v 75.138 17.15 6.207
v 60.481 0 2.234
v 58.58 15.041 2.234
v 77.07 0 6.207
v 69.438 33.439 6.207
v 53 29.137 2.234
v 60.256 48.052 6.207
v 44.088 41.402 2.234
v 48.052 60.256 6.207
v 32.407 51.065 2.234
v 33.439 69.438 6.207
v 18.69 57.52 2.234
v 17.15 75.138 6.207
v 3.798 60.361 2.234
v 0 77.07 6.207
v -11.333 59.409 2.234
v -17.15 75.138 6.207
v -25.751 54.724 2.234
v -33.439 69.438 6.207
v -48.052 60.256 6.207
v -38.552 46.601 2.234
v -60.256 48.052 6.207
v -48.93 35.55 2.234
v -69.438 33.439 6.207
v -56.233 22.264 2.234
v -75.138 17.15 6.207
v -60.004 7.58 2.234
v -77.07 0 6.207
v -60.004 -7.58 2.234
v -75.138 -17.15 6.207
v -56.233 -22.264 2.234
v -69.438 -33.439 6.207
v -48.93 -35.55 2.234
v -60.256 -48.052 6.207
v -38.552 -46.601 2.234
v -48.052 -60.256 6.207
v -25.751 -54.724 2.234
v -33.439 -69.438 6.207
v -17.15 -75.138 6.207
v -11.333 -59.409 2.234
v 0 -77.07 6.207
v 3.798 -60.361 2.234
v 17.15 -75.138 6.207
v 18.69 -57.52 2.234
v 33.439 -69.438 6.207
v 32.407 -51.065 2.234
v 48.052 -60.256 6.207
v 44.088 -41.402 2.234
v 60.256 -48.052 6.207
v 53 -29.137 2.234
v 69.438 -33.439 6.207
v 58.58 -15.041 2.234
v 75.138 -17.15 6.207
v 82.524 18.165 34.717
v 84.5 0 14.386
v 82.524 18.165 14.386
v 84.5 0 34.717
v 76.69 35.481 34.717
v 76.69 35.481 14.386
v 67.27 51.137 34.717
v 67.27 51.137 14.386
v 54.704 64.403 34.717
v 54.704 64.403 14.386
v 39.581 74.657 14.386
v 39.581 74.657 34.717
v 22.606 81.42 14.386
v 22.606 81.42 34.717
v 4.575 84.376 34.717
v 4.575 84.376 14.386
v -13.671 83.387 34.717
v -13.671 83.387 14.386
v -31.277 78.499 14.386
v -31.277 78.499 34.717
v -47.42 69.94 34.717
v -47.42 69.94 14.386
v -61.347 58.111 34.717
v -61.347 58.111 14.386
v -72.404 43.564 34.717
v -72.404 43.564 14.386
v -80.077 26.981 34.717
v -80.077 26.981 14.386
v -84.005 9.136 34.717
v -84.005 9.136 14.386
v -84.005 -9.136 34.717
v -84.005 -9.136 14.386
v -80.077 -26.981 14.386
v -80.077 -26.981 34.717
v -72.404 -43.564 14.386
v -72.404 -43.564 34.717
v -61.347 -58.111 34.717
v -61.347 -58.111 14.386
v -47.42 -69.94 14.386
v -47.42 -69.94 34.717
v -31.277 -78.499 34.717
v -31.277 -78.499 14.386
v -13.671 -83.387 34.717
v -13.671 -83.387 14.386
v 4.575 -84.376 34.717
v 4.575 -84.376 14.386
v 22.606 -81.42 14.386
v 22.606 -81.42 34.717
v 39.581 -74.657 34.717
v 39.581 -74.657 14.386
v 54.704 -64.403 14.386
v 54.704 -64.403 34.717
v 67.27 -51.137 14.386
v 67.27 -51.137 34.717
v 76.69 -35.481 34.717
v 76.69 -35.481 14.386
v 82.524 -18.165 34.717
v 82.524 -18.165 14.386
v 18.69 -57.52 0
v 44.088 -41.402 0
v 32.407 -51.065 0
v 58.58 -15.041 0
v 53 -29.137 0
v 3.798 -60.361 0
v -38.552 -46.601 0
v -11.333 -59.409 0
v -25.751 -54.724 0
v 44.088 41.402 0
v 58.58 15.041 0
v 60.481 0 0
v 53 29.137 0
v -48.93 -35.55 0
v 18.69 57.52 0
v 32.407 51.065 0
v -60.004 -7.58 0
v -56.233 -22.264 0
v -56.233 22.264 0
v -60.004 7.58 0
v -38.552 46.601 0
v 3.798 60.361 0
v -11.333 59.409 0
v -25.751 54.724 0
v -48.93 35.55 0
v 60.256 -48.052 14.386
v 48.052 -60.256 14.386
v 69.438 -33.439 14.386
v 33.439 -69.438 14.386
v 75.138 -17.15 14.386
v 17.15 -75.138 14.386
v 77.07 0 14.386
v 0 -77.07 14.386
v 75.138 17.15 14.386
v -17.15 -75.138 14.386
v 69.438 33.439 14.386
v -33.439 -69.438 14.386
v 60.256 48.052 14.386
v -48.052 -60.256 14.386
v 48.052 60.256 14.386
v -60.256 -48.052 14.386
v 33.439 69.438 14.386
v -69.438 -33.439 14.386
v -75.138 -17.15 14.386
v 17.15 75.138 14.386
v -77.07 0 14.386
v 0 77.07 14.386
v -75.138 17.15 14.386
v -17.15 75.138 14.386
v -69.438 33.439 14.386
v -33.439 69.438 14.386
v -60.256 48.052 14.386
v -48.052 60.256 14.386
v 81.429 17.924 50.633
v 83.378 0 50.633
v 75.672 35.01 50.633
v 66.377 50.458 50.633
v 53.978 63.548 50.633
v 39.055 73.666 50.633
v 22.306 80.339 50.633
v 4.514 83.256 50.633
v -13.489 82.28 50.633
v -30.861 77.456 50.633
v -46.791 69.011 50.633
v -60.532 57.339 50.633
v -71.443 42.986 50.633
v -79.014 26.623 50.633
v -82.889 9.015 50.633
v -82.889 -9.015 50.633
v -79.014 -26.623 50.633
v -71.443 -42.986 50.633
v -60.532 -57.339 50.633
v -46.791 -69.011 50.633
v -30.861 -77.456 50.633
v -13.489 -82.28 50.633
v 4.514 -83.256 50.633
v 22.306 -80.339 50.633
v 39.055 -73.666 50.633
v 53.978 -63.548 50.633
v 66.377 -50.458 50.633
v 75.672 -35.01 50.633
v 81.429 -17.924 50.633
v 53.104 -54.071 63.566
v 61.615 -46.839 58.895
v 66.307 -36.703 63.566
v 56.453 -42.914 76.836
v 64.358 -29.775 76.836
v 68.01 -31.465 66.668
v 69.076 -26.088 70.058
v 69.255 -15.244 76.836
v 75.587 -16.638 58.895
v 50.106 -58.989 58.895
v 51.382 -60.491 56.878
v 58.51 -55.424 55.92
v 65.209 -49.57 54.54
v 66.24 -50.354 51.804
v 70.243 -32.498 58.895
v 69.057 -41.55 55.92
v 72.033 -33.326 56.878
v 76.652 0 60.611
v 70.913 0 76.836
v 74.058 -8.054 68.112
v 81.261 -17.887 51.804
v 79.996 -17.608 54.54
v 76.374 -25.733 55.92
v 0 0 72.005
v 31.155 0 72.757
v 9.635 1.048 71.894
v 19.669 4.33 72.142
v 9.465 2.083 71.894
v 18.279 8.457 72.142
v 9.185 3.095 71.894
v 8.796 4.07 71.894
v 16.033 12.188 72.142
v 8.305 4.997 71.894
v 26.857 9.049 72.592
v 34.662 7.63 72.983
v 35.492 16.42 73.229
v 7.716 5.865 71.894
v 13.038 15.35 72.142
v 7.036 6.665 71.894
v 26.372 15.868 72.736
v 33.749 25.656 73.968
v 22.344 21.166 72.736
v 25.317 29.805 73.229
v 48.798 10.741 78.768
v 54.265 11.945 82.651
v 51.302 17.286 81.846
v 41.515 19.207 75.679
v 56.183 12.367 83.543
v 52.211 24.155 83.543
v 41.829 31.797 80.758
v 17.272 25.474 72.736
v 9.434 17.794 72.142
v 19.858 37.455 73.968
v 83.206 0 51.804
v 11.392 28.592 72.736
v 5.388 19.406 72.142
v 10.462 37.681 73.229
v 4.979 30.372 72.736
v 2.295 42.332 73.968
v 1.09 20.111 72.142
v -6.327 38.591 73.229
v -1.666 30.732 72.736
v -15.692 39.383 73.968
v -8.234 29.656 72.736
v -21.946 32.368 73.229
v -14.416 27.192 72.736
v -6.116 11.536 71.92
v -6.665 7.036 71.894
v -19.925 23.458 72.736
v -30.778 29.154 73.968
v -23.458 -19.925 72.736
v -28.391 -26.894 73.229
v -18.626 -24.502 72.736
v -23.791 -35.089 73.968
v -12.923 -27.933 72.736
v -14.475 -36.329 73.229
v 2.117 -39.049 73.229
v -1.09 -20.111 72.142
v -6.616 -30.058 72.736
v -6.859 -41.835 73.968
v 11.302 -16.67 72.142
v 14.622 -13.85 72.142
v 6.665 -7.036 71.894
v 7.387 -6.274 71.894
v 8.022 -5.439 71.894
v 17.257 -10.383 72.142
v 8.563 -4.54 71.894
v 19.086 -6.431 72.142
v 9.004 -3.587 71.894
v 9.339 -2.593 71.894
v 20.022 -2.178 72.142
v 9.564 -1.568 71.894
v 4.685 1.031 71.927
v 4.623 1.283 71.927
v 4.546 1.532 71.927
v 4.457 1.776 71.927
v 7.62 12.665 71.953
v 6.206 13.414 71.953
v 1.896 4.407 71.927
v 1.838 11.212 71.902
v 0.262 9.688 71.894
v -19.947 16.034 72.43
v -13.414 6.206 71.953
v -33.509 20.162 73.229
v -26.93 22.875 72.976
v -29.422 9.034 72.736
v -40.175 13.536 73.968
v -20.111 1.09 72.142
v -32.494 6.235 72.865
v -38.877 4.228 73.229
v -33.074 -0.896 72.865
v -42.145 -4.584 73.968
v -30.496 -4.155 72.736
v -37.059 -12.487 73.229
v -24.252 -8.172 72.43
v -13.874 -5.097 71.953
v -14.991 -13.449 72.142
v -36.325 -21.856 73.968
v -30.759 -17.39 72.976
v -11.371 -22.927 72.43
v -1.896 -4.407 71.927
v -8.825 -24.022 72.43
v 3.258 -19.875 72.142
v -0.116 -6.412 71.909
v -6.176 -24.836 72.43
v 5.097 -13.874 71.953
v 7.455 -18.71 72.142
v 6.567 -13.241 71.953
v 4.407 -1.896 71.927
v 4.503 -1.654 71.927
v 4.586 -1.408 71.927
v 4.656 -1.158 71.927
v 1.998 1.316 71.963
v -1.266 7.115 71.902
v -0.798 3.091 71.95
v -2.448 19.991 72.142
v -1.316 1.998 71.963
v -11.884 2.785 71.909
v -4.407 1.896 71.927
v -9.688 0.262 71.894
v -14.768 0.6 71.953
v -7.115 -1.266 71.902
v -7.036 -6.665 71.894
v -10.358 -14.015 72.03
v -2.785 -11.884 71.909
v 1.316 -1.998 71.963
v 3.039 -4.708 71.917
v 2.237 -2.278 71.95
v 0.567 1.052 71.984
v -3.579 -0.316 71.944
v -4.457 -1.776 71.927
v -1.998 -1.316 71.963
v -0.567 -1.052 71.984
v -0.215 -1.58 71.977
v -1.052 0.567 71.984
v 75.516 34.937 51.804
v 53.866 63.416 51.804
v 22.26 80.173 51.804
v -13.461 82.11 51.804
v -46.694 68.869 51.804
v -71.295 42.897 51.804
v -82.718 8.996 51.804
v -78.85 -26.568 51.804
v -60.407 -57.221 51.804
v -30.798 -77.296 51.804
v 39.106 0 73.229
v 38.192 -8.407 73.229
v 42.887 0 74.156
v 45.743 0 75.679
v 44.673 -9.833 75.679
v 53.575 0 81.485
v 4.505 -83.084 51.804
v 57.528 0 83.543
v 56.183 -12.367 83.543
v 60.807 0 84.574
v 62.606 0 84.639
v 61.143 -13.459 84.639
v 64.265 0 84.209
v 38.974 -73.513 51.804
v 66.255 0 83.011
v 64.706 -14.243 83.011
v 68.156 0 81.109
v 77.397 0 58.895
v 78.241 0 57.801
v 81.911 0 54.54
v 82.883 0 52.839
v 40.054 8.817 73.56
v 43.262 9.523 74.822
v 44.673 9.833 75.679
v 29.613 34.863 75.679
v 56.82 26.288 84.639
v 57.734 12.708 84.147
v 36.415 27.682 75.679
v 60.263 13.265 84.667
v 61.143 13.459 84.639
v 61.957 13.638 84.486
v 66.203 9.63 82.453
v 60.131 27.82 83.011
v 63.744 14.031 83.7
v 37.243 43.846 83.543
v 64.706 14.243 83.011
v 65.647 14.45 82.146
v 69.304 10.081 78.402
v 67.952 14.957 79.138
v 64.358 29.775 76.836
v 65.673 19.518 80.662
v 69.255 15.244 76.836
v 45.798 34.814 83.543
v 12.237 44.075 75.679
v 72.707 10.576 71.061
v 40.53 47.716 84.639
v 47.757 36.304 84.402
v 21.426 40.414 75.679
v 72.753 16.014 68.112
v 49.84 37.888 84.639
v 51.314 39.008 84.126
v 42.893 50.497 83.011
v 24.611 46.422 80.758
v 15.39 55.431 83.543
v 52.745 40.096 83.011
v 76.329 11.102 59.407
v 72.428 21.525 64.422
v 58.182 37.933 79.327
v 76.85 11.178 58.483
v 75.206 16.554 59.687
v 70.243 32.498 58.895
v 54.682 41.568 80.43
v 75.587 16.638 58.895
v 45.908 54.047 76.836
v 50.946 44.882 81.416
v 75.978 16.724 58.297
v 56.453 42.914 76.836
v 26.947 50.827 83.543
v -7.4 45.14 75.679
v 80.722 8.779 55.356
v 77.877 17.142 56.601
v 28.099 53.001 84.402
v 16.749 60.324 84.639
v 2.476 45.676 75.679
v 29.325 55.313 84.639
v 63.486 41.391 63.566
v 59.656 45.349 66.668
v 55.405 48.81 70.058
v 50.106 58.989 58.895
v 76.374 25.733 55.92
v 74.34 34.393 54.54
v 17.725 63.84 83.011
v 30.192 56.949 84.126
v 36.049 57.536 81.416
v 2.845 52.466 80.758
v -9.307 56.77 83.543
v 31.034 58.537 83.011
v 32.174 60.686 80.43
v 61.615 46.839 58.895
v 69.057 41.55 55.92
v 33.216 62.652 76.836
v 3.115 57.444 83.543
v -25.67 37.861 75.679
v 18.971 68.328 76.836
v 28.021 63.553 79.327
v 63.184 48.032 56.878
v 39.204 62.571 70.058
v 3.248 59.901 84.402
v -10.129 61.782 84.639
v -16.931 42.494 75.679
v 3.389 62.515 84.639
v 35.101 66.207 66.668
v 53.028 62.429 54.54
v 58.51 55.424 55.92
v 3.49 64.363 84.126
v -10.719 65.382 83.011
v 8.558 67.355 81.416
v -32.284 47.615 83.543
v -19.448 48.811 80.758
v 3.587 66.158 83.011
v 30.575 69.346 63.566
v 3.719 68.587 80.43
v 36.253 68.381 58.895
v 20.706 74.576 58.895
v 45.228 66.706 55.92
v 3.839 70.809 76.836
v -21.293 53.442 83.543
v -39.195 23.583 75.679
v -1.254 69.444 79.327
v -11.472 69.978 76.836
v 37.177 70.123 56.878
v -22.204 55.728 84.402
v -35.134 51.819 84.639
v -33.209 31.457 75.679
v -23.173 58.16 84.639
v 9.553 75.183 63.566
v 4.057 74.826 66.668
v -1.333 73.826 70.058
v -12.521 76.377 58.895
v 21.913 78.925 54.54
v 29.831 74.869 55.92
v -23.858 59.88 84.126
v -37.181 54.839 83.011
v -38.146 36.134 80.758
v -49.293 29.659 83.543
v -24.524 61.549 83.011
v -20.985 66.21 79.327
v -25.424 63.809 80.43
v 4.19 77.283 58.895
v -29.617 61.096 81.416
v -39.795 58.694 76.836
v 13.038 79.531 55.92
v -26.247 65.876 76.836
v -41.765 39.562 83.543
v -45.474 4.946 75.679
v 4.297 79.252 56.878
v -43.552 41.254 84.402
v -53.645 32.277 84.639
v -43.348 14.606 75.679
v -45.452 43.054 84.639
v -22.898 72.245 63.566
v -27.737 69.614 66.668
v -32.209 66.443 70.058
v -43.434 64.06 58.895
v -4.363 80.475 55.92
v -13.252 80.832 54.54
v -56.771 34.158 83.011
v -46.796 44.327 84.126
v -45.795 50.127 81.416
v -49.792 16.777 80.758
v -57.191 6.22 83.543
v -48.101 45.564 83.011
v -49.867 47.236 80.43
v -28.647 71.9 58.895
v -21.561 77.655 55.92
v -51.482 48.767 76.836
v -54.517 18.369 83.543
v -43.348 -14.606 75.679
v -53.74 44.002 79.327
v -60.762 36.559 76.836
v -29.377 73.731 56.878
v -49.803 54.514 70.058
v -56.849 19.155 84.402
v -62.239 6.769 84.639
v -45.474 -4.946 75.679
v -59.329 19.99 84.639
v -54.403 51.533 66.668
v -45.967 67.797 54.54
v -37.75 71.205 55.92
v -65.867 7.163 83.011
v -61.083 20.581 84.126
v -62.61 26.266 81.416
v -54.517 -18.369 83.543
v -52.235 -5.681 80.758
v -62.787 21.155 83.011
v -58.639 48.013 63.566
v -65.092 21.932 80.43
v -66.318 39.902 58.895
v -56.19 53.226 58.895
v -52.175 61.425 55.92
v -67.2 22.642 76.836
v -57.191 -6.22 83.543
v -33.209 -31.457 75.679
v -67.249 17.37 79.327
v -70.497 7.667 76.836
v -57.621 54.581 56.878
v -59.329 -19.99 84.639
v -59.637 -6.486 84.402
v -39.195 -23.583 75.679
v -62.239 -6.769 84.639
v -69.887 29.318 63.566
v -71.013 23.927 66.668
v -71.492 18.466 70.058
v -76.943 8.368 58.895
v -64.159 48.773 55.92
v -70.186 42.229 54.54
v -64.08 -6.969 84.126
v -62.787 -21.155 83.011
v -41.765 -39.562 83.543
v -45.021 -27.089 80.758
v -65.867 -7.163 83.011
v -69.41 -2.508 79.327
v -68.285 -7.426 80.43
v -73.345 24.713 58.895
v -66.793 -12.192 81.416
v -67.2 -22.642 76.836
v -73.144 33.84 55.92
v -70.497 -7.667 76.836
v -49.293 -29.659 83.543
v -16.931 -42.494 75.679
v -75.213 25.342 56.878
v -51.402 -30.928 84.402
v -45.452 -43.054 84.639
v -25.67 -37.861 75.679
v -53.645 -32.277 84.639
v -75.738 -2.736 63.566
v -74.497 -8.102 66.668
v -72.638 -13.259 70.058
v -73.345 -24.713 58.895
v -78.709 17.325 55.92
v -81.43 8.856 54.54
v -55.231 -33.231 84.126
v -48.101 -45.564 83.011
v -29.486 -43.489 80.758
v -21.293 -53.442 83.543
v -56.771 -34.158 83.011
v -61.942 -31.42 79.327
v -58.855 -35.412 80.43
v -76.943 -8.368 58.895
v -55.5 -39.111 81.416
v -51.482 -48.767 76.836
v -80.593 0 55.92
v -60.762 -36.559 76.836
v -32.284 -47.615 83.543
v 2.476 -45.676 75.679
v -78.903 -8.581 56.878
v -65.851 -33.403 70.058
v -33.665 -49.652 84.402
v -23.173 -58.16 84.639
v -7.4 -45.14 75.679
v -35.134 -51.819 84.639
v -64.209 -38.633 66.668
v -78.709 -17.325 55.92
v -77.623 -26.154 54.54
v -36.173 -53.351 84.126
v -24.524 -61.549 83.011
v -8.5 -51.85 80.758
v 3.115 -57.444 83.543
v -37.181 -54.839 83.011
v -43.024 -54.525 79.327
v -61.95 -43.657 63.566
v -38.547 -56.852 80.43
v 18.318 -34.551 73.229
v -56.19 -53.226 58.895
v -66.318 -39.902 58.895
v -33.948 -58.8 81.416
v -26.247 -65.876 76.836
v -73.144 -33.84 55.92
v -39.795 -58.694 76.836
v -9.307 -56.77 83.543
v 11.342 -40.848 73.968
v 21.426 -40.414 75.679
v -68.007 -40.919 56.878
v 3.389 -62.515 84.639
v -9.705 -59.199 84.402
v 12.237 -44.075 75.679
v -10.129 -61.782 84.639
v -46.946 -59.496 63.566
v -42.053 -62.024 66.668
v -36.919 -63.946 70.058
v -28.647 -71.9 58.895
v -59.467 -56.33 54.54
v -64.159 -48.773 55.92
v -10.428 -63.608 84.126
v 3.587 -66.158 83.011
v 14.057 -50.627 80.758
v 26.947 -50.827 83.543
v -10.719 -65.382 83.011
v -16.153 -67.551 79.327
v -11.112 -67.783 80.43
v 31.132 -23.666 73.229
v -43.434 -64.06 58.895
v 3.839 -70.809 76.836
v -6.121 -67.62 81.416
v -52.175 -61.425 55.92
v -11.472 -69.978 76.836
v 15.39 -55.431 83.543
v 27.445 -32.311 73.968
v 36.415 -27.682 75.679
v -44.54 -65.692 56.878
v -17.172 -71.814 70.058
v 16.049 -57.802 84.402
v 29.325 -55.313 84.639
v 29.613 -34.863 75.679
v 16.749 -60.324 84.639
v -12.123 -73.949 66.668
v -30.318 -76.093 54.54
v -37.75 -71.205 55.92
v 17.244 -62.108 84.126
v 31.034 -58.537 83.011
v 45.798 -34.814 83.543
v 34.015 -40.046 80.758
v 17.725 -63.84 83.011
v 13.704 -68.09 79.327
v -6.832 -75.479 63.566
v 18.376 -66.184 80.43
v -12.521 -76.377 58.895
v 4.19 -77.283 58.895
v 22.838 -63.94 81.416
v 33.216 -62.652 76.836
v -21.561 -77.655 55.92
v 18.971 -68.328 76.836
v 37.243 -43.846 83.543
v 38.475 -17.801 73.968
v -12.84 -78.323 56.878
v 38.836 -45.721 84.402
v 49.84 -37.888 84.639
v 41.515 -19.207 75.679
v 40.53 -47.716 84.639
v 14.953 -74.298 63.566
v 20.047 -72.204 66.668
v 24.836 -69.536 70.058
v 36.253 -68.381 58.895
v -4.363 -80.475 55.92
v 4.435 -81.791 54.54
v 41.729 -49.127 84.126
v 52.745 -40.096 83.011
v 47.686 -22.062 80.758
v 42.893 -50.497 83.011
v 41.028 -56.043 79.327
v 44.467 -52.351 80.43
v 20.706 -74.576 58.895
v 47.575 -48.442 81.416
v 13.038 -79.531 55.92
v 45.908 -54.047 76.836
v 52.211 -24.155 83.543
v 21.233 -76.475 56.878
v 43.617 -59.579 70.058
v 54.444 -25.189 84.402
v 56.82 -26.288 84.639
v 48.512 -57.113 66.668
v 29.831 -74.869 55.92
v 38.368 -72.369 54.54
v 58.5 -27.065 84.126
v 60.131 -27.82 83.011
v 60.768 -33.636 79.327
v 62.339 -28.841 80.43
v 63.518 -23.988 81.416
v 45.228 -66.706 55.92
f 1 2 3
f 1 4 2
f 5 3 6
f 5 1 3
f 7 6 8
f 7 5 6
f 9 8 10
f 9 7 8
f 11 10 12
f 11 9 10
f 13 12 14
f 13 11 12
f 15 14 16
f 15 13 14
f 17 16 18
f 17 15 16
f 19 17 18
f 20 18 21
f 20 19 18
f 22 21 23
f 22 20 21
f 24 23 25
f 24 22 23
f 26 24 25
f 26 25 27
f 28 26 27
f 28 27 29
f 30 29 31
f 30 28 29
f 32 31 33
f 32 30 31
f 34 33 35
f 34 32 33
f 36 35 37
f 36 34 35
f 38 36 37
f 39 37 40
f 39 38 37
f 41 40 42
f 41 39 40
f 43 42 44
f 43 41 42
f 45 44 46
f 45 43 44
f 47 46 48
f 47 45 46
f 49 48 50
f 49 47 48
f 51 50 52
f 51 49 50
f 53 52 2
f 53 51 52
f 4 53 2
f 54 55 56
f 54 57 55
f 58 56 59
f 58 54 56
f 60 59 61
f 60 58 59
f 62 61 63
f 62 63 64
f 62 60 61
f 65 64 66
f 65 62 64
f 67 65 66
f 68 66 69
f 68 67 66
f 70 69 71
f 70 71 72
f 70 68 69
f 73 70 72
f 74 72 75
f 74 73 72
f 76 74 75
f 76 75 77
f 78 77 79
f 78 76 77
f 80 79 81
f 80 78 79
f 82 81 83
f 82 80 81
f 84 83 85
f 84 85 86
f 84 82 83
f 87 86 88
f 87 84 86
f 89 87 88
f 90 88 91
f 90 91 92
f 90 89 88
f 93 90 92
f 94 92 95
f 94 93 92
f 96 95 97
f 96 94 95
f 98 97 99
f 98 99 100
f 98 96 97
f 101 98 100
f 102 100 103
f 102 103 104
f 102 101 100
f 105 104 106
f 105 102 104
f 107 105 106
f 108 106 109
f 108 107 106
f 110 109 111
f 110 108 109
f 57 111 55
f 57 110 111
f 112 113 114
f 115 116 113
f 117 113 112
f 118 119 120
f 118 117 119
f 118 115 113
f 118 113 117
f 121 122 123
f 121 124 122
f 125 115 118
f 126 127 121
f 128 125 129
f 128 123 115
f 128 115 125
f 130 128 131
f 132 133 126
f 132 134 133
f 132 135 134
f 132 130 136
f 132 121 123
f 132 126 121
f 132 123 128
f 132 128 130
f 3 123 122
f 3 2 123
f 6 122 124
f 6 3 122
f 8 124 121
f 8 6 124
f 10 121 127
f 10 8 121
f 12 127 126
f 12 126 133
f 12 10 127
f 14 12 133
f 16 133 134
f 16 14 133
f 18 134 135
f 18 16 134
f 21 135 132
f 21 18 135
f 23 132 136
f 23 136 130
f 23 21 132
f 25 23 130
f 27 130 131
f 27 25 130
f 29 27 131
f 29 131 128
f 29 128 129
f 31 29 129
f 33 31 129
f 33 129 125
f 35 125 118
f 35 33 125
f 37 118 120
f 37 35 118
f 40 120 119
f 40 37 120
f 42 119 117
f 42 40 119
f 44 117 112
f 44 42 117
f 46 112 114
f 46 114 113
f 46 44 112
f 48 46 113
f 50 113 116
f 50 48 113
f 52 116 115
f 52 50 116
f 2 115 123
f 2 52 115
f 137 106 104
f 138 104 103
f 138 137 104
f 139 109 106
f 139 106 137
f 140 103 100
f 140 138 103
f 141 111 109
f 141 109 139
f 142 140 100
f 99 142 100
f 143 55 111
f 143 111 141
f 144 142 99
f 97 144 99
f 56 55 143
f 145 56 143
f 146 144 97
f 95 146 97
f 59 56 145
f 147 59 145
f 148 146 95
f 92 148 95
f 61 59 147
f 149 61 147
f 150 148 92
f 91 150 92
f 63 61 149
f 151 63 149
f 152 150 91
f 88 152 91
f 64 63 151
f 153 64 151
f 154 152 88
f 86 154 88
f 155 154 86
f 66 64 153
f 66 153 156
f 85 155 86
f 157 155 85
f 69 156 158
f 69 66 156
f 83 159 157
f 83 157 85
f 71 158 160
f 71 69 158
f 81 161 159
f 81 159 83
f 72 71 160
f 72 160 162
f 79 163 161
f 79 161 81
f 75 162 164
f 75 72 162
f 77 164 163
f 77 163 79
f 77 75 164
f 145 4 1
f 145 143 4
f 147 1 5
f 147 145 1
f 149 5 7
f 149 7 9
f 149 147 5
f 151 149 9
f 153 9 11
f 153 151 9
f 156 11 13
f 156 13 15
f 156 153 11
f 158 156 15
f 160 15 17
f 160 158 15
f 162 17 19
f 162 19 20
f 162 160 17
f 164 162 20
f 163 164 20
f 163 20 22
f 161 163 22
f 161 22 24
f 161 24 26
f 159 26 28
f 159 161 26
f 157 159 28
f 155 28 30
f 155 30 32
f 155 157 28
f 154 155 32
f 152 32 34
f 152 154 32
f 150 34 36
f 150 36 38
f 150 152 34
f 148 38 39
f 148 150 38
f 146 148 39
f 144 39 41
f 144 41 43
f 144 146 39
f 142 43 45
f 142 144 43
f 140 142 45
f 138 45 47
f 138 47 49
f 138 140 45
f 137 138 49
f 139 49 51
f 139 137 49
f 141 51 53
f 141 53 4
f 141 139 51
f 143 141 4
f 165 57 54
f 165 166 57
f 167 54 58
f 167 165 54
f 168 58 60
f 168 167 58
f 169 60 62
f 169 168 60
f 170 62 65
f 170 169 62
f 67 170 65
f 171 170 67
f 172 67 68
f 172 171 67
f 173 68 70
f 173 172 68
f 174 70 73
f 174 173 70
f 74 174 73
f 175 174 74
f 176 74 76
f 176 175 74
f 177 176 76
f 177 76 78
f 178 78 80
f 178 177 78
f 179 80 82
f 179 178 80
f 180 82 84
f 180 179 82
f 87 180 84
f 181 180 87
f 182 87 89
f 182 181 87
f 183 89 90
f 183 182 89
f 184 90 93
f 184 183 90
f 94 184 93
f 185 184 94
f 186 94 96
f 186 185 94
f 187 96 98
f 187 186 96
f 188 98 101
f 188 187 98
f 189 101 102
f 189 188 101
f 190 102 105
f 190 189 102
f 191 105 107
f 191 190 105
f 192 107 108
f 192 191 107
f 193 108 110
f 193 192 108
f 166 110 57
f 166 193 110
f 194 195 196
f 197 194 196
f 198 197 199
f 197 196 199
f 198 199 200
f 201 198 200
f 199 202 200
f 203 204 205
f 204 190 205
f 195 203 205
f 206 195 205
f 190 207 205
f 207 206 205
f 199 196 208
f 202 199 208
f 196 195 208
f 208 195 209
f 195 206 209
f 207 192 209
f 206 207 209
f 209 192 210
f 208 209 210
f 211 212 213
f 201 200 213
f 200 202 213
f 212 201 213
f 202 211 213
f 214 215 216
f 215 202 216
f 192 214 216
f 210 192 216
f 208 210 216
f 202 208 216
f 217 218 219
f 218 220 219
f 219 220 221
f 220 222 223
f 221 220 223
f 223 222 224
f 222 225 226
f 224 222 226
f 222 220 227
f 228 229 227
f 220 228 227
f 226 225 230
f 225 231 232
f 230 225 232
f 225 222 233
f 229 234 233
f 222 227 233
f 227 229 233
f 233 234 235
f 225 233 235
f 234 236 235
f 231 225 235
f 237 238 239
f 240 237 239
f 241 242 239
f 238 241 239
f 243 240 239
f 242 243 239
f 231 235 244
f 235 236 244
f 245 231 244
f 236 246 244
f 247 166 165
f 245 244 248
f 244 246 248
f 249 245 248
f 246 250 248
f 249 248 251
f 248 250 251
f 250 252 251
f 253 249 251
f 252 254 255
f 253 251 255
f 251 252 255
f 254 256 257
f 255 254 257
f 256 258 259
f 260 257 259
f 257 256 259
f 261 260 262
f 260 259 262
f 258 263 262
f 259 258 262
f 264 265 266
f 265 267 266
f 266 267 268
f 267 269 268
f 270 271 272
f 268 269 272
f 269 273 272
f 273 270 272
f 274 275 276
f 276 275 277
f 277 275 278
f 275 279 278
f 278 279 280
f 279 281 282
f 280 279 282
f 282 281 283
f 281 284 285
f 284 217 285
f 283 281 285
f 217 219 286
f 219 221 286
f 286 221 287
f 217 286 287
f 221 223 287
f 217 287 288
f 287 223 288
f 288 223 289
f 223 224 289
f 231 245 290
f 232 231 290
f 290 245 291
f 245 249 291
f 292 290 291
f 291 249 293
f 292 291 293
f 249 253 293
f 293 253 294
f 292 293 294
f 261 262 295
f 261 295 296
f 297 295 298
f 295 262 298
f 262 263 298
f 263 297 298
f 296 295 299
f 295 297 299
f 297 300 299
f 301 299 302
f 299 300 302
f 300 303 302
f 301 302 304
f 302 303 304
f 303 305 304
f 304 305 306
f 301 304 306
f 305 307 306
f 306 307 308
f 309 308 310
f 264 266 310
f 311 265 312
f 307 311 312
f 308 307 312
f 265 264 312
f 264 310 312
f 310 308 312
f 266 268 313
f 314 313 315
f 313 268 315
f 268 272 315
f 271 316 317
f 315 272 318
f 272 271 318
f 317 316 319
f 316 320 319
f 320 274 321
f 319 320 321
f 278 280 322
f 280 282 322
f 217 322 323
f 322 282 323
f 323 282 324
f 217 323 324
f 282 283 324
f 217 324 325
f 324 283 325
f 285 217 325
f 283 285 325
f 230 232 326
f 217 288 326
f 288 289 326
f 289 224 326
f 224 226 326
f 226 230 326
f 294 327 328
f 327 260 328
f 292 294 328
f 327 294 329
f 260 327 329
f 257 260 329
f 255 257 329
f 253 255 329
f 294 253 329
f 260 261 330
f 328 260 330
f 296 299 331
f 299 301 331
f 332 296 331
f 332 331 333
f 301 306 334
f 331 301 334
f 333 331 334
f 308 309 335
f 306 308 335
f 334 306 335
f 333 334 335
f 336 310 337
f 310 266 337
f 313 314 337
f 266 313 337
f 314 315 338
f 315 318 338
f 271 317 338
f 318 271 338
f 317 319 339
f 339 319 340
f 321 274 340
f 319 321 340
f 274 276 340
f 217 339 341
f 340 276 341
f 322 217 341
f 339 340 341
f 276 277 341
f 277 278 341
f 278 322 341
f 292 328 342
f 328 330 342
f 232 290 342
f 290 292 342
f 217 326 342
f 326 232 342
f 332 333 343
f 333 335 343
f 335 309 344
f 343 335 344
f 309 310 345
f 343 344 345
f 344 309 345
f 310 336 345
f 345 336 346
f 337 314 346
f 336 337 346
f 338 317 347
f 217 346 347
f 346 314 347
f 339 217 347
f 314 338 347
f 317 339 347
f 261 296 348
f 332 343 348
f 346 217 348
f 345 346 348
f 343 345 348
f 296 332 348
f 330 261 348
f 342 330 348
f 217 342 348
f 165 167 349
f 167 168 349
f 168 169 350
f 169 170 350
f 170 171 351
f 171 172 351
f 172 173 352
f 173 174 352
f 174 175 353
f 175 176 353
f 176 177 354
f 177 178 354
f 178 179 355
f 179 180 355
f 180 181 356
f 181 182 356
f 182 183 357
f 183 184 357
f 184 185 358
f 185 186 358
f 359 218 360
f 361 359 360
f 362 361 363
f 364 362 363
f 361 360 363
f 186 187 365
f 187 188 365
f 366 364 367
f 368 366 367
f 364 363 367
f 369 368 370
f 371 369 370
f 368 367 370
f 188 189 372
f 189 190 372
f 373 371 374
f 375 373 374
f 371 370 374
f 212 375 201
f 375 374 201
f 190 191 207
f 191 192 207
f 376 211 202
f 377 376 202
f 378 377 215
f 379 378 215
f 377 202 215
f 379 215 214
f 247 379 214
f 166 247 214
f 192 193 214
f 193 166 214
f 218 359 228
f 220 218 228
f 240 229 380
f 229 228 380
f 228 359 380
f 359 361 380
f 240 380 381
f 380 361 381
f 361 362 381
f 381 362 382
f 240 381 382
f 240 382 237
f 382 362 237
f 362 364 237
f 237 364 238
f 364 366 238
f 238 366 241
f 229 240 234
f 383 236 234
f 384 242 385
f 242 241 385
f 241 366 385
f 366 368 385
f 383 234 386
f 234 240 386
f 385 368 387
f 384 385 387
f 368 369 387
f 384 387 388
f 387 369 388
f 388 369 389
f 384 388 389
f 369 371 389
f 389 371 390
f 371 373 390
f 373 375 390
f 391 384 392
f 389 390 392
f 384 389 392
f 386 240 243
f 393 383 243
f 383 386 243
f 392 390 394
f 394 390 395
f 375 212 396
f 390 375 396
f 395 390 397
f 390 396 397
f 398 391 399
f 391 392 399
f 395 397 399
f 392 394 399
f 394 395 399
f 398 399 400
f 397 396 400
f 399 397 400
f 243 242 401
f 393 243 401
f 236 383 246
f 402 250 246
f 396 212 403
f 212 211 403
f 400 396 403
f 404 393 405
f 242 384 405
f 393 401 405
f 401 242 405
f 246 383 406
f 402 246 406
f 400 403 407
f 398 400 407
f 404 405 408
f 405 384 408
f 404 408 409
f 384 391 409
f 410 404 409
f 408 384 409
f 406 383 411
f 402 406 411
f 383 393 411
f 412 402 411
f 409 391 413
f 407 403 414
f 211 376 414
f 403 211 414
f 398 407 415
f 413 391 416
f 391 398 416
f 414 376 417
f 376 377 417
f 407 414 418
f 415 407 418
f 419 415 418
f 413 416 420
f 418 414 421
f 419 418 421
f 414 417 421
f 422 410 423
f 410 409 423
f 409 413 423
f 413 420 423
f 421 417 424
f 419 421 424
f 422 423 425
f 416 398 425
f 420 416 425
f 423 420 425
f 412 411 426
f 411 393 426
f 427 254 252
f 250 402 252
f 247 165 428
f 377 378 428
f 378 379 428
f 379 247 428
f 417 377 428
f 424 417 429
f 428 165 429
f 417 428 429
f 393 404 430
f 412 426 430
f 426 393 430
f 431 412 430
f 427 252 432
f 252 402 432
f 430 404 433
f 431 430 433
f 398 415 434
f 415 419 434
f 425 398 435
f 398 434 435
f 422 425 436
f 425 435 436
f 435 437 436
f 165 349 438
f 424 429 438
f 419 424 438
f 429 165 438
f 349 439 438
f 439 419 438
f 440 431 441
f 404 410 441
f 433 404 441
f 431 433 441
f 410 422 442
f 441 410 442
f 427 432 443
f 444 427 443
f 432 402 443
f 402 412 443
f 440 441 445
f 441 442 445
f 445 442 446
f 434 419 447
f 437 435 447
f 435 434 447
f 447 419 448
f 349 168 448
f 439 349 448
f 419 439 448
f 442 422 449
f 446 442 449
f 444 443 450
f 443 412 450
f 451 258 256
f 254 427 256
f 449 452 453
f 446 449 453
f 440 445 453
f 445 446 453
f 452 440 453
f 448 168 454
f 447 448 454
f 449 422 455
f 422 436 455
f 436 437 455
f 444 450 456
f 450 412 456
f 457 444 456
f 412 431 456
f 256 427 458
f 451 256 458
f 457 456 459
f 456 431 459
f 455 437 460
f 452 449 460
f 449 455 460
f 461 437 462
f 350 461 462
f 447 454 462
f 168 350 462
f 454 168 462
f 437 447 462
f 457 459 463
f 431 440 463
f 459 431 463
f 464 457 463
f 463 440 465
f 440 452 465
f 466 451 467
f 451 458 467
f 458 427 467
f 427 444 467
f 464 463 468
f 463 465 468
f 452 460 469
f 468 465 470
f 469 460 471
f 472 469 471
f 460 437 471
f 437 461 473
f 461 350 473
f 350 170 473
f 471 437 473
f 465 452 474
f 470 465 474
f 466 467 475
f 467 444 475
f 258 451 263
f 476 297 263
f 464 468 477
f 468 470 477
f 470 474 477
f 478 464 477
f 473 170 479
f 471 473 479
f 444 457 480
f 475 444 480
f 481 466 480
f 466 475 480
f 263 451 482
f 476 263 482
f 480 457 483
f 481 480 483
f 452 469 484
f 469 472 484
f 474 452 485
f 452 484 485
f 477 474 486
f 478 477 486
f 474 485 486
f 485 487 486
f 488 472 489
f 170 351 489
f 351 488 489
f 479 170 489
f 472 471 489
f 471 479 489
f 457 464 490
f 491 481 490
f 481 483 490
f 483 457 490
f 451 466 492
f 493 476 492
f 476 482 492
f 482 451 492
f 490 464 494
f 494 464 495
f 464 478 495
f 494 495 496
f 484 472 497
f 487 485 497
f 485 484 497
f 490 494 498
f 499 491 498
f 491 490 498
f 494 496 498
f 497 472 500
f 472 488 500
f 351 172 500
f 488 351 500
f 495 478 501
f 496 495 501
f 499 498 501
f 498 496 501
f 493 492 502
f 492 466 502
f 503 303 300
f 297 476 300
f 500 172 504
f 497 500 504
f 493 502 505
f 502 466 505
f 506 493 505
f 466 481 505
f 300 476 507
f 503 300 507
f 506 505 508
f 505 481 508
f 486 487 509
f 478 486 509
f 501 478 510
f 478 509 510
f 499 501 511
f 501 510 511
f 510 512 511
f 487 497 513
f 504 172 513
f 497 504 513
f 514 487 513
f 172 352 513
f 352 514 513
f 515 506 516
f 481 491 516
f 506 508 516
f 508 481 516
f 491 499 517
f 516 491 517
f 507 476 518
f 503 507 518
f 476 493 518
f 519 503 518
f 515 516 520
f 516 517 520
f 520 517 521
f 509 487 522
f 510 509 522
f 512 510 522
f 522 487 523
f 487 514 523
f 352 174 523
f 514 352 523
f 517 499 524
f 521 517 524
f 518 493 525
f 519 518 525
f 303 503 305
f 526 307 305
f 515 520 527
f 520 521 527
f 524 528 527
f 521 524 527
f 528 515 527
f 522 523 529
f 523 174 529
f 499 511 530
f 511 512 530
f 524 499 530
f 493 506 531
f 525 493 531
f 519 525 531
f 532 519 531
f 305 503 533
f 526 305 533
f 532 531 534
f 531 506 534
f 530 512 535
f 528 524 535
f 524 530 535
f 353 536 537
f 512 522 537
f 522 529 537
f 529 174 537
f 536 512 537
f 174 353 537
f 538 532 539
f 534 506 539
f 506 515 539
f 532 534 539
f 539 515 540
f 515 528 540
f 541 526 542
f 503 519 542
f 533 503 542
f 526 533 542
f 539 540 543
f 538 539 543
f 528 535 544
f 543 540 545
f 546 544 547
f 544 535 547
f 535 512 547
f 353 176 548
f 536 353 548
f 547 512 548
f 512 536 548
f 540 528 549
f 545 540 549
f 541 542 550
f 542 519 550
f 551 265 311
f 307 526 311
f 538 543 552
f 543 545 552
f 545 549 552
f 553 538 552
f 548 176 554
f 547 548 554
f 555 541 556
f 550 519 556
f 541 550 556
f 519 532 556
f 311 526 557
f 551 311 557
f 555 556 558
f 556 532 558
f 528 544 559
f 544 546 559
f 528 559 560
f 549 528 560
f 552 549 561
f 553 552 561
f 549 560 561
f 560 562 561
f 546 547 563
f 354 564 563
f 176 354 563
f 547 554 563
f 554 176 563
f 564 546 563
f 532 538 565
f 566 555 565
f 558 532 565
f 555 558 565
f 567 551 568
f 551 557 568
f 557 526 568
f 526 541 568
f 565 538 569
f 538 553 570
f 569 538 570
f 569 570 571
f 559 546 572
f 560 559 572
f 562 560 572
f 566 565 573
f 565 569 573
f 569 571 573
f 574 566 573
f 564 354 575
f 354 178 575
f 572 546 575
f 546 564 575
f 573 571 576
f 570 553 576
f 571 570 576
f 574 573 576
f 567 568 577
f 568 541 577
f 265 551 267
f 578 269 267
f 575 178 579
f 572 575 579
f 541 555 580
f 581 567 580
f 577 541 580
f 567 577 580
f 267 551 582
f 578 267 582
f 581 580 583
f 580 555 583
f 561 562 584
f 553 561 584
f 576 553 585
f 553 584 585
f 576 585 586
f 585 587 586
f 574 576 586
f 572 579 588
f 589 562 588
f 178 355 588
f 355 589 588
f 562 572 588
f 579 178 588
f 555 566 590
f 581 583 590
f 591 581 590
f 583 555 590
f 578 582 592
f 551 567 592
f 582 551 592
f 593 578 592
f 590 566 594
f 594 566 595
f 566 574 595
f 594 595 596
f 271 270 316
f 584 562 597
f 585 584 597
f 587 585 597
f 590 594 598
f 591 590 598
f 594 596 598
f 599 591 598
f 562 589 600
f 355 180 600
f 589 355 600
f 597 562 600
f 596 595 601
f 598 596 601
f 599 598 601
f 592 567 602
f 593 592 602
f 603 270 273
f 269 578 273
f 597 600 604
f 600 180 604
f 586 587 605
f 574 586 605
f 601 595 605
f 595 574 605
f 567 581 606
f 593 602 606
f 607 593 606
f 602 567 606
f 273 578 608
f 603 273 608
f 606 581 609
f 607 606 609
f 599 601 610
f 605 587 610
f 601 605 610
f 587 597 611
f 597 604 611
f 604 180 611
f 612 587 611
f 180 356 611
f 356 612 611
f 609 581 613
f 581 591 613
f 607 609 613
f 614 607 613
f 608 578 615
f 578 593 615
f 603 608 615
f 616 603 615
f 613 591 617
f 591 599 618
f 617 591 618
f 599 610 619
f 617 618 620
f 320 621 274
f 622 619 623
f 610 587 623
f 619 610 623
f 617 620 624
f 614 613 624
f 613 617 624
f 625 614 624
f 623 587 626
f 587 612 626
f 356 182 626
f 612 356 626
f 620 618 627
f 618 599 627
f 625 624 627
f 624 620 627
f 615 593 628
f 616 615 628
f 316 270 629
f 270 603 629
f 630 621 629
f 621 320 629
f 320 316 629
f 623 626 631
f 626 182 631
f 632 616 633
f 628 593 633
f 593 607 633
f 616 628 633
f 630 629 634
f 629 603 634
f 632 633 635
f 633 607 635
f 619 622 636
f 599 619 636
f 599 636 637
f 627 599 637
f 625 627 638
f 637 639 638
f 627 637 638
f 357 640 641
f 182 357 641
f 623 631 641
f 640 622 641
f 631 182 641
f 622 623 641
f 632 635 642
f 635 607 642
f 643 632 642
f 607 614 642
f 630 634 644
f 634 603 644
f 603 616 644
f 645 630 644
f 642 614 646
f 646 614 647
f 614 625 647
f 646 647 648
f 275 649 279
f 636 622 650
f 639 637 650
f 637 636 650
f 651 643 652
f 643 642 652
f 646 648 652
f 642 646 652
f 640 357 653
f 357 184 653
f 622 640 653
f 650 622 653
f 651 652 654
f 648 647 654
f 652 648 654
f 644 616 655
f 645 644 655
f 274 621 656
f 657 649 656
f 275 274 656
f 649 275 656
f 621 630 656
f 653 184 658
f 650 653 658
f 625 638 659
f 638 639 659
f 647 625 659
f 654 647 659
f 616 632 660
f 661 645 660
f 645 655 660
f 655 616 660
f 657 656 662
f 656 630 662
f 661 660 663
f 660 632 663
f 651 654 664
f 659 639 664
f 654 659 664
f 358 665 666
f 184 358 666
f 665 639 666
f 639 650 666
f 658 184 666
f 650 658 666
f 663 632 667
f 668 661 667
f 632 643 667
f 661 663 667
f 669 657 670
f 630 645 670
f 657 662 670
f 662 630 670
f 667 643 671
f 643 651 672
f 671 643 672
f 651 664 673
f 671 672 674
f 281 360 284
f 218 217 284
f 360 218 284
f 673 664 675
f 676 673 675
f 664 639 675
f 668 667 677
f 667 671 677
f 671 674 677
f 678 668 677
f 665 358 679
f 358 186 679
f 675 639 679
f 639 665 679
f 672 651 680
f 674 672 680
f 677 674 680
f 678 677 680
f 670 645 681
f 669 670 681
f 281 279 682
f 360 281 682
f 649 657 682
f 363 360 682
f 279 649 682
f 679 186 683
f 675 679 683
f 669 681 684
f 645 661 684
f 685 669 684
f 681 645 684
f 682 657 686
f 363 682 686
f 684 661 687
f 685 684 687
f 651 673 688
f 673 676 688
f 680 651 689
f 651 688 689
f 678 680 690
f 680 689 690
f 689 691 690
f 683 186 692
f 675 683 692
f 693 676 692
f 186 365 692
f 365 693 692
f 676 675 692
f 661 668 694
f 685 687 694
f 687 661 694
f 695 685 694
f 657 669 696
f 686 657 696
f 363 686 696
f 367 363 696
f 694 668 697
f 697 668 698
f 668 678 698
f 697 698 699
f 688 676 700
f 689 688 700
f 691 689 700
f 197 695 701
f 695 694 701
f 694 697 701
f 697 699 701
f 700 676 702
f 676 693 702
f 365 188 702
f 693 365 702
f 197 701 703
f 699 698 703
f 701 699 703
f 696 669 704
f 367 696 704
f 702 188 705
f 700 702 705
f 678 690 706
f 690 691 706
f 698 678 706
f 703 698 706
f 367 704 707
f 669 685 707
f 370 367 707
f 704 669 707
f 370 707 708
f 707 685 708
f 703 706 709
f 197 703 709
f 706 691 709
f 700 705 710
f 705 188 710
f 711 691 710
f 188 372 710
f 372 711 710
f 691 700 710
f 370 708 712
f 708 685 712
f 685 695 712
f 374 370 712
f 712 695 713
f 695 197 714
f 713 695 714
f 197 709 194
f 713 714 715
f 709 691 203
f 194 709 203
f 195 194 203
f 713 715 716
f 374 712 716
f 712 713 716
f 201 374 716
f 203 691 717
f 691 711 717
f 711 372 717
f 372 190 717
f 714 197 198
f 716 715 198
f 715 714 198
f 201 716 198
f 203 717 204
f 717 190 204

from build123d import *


with BuildPart() as f1:
    # F0 (on Front) → F1 (revolve)
    with BuildSketch(Plane.XZ):
        with BuildLine():
            Line((0, 72.0053985715), (0, 0))
            Line((0, 0), (60.4805797338, 0))
            Line((60.4805797338, 0), (60.4805797338, 2.2335746326))
            Line((60.4805797338, 2.2335746326), (77.0699828863, 6.2070856802))
            Line((77.0699828863, 6.2070856802), (77.0699828863, 14.3860364848))
            Line((77.0699828863, 14.3860364848), (84.5, 14.3860364848))
            Line((84.5, 14.3860364848), (84.5, 34.7170196474))
            Line((84.5, 34.7170196474), (83.3781063557, 50.6331585348))
            add(Edge.make_bspline(
                [(0, 72.0053985715), (5.3624783169, 71.9092158768), (16.3070110762, 71.7129166497), (34.6731579332, 73.0800545991), (43.6552311193, 73.1645561389), (52.6980338602, 81.305037743), (57.0912268293, 83.4401429499), (62.866659385, 85.6198608303), (69.5488472767, 81.1195946469), (75.1692218019, 67.5121489578), (76.8121350319, 58.3757299789), (80.3315916954, 56.4324627805), (83.1774026155, 53.498275578), (83.3781063557, 50.6331585348)],
                knots=[0, 0, 0, 0, 0.1230403877, 0.2511187559, 0.3413960041, 0.4424844079, 0.5106651004, 0.5801720432, 0.6602618119, 0.7773084872, 0.8667002588, 0.923122047, 1, 1, 1, 1], degree=3))
        make_face()
    revolve(axis=Axis((0, 0, 36.0026992857), (0, 0, 1)))


solid = f1.part
